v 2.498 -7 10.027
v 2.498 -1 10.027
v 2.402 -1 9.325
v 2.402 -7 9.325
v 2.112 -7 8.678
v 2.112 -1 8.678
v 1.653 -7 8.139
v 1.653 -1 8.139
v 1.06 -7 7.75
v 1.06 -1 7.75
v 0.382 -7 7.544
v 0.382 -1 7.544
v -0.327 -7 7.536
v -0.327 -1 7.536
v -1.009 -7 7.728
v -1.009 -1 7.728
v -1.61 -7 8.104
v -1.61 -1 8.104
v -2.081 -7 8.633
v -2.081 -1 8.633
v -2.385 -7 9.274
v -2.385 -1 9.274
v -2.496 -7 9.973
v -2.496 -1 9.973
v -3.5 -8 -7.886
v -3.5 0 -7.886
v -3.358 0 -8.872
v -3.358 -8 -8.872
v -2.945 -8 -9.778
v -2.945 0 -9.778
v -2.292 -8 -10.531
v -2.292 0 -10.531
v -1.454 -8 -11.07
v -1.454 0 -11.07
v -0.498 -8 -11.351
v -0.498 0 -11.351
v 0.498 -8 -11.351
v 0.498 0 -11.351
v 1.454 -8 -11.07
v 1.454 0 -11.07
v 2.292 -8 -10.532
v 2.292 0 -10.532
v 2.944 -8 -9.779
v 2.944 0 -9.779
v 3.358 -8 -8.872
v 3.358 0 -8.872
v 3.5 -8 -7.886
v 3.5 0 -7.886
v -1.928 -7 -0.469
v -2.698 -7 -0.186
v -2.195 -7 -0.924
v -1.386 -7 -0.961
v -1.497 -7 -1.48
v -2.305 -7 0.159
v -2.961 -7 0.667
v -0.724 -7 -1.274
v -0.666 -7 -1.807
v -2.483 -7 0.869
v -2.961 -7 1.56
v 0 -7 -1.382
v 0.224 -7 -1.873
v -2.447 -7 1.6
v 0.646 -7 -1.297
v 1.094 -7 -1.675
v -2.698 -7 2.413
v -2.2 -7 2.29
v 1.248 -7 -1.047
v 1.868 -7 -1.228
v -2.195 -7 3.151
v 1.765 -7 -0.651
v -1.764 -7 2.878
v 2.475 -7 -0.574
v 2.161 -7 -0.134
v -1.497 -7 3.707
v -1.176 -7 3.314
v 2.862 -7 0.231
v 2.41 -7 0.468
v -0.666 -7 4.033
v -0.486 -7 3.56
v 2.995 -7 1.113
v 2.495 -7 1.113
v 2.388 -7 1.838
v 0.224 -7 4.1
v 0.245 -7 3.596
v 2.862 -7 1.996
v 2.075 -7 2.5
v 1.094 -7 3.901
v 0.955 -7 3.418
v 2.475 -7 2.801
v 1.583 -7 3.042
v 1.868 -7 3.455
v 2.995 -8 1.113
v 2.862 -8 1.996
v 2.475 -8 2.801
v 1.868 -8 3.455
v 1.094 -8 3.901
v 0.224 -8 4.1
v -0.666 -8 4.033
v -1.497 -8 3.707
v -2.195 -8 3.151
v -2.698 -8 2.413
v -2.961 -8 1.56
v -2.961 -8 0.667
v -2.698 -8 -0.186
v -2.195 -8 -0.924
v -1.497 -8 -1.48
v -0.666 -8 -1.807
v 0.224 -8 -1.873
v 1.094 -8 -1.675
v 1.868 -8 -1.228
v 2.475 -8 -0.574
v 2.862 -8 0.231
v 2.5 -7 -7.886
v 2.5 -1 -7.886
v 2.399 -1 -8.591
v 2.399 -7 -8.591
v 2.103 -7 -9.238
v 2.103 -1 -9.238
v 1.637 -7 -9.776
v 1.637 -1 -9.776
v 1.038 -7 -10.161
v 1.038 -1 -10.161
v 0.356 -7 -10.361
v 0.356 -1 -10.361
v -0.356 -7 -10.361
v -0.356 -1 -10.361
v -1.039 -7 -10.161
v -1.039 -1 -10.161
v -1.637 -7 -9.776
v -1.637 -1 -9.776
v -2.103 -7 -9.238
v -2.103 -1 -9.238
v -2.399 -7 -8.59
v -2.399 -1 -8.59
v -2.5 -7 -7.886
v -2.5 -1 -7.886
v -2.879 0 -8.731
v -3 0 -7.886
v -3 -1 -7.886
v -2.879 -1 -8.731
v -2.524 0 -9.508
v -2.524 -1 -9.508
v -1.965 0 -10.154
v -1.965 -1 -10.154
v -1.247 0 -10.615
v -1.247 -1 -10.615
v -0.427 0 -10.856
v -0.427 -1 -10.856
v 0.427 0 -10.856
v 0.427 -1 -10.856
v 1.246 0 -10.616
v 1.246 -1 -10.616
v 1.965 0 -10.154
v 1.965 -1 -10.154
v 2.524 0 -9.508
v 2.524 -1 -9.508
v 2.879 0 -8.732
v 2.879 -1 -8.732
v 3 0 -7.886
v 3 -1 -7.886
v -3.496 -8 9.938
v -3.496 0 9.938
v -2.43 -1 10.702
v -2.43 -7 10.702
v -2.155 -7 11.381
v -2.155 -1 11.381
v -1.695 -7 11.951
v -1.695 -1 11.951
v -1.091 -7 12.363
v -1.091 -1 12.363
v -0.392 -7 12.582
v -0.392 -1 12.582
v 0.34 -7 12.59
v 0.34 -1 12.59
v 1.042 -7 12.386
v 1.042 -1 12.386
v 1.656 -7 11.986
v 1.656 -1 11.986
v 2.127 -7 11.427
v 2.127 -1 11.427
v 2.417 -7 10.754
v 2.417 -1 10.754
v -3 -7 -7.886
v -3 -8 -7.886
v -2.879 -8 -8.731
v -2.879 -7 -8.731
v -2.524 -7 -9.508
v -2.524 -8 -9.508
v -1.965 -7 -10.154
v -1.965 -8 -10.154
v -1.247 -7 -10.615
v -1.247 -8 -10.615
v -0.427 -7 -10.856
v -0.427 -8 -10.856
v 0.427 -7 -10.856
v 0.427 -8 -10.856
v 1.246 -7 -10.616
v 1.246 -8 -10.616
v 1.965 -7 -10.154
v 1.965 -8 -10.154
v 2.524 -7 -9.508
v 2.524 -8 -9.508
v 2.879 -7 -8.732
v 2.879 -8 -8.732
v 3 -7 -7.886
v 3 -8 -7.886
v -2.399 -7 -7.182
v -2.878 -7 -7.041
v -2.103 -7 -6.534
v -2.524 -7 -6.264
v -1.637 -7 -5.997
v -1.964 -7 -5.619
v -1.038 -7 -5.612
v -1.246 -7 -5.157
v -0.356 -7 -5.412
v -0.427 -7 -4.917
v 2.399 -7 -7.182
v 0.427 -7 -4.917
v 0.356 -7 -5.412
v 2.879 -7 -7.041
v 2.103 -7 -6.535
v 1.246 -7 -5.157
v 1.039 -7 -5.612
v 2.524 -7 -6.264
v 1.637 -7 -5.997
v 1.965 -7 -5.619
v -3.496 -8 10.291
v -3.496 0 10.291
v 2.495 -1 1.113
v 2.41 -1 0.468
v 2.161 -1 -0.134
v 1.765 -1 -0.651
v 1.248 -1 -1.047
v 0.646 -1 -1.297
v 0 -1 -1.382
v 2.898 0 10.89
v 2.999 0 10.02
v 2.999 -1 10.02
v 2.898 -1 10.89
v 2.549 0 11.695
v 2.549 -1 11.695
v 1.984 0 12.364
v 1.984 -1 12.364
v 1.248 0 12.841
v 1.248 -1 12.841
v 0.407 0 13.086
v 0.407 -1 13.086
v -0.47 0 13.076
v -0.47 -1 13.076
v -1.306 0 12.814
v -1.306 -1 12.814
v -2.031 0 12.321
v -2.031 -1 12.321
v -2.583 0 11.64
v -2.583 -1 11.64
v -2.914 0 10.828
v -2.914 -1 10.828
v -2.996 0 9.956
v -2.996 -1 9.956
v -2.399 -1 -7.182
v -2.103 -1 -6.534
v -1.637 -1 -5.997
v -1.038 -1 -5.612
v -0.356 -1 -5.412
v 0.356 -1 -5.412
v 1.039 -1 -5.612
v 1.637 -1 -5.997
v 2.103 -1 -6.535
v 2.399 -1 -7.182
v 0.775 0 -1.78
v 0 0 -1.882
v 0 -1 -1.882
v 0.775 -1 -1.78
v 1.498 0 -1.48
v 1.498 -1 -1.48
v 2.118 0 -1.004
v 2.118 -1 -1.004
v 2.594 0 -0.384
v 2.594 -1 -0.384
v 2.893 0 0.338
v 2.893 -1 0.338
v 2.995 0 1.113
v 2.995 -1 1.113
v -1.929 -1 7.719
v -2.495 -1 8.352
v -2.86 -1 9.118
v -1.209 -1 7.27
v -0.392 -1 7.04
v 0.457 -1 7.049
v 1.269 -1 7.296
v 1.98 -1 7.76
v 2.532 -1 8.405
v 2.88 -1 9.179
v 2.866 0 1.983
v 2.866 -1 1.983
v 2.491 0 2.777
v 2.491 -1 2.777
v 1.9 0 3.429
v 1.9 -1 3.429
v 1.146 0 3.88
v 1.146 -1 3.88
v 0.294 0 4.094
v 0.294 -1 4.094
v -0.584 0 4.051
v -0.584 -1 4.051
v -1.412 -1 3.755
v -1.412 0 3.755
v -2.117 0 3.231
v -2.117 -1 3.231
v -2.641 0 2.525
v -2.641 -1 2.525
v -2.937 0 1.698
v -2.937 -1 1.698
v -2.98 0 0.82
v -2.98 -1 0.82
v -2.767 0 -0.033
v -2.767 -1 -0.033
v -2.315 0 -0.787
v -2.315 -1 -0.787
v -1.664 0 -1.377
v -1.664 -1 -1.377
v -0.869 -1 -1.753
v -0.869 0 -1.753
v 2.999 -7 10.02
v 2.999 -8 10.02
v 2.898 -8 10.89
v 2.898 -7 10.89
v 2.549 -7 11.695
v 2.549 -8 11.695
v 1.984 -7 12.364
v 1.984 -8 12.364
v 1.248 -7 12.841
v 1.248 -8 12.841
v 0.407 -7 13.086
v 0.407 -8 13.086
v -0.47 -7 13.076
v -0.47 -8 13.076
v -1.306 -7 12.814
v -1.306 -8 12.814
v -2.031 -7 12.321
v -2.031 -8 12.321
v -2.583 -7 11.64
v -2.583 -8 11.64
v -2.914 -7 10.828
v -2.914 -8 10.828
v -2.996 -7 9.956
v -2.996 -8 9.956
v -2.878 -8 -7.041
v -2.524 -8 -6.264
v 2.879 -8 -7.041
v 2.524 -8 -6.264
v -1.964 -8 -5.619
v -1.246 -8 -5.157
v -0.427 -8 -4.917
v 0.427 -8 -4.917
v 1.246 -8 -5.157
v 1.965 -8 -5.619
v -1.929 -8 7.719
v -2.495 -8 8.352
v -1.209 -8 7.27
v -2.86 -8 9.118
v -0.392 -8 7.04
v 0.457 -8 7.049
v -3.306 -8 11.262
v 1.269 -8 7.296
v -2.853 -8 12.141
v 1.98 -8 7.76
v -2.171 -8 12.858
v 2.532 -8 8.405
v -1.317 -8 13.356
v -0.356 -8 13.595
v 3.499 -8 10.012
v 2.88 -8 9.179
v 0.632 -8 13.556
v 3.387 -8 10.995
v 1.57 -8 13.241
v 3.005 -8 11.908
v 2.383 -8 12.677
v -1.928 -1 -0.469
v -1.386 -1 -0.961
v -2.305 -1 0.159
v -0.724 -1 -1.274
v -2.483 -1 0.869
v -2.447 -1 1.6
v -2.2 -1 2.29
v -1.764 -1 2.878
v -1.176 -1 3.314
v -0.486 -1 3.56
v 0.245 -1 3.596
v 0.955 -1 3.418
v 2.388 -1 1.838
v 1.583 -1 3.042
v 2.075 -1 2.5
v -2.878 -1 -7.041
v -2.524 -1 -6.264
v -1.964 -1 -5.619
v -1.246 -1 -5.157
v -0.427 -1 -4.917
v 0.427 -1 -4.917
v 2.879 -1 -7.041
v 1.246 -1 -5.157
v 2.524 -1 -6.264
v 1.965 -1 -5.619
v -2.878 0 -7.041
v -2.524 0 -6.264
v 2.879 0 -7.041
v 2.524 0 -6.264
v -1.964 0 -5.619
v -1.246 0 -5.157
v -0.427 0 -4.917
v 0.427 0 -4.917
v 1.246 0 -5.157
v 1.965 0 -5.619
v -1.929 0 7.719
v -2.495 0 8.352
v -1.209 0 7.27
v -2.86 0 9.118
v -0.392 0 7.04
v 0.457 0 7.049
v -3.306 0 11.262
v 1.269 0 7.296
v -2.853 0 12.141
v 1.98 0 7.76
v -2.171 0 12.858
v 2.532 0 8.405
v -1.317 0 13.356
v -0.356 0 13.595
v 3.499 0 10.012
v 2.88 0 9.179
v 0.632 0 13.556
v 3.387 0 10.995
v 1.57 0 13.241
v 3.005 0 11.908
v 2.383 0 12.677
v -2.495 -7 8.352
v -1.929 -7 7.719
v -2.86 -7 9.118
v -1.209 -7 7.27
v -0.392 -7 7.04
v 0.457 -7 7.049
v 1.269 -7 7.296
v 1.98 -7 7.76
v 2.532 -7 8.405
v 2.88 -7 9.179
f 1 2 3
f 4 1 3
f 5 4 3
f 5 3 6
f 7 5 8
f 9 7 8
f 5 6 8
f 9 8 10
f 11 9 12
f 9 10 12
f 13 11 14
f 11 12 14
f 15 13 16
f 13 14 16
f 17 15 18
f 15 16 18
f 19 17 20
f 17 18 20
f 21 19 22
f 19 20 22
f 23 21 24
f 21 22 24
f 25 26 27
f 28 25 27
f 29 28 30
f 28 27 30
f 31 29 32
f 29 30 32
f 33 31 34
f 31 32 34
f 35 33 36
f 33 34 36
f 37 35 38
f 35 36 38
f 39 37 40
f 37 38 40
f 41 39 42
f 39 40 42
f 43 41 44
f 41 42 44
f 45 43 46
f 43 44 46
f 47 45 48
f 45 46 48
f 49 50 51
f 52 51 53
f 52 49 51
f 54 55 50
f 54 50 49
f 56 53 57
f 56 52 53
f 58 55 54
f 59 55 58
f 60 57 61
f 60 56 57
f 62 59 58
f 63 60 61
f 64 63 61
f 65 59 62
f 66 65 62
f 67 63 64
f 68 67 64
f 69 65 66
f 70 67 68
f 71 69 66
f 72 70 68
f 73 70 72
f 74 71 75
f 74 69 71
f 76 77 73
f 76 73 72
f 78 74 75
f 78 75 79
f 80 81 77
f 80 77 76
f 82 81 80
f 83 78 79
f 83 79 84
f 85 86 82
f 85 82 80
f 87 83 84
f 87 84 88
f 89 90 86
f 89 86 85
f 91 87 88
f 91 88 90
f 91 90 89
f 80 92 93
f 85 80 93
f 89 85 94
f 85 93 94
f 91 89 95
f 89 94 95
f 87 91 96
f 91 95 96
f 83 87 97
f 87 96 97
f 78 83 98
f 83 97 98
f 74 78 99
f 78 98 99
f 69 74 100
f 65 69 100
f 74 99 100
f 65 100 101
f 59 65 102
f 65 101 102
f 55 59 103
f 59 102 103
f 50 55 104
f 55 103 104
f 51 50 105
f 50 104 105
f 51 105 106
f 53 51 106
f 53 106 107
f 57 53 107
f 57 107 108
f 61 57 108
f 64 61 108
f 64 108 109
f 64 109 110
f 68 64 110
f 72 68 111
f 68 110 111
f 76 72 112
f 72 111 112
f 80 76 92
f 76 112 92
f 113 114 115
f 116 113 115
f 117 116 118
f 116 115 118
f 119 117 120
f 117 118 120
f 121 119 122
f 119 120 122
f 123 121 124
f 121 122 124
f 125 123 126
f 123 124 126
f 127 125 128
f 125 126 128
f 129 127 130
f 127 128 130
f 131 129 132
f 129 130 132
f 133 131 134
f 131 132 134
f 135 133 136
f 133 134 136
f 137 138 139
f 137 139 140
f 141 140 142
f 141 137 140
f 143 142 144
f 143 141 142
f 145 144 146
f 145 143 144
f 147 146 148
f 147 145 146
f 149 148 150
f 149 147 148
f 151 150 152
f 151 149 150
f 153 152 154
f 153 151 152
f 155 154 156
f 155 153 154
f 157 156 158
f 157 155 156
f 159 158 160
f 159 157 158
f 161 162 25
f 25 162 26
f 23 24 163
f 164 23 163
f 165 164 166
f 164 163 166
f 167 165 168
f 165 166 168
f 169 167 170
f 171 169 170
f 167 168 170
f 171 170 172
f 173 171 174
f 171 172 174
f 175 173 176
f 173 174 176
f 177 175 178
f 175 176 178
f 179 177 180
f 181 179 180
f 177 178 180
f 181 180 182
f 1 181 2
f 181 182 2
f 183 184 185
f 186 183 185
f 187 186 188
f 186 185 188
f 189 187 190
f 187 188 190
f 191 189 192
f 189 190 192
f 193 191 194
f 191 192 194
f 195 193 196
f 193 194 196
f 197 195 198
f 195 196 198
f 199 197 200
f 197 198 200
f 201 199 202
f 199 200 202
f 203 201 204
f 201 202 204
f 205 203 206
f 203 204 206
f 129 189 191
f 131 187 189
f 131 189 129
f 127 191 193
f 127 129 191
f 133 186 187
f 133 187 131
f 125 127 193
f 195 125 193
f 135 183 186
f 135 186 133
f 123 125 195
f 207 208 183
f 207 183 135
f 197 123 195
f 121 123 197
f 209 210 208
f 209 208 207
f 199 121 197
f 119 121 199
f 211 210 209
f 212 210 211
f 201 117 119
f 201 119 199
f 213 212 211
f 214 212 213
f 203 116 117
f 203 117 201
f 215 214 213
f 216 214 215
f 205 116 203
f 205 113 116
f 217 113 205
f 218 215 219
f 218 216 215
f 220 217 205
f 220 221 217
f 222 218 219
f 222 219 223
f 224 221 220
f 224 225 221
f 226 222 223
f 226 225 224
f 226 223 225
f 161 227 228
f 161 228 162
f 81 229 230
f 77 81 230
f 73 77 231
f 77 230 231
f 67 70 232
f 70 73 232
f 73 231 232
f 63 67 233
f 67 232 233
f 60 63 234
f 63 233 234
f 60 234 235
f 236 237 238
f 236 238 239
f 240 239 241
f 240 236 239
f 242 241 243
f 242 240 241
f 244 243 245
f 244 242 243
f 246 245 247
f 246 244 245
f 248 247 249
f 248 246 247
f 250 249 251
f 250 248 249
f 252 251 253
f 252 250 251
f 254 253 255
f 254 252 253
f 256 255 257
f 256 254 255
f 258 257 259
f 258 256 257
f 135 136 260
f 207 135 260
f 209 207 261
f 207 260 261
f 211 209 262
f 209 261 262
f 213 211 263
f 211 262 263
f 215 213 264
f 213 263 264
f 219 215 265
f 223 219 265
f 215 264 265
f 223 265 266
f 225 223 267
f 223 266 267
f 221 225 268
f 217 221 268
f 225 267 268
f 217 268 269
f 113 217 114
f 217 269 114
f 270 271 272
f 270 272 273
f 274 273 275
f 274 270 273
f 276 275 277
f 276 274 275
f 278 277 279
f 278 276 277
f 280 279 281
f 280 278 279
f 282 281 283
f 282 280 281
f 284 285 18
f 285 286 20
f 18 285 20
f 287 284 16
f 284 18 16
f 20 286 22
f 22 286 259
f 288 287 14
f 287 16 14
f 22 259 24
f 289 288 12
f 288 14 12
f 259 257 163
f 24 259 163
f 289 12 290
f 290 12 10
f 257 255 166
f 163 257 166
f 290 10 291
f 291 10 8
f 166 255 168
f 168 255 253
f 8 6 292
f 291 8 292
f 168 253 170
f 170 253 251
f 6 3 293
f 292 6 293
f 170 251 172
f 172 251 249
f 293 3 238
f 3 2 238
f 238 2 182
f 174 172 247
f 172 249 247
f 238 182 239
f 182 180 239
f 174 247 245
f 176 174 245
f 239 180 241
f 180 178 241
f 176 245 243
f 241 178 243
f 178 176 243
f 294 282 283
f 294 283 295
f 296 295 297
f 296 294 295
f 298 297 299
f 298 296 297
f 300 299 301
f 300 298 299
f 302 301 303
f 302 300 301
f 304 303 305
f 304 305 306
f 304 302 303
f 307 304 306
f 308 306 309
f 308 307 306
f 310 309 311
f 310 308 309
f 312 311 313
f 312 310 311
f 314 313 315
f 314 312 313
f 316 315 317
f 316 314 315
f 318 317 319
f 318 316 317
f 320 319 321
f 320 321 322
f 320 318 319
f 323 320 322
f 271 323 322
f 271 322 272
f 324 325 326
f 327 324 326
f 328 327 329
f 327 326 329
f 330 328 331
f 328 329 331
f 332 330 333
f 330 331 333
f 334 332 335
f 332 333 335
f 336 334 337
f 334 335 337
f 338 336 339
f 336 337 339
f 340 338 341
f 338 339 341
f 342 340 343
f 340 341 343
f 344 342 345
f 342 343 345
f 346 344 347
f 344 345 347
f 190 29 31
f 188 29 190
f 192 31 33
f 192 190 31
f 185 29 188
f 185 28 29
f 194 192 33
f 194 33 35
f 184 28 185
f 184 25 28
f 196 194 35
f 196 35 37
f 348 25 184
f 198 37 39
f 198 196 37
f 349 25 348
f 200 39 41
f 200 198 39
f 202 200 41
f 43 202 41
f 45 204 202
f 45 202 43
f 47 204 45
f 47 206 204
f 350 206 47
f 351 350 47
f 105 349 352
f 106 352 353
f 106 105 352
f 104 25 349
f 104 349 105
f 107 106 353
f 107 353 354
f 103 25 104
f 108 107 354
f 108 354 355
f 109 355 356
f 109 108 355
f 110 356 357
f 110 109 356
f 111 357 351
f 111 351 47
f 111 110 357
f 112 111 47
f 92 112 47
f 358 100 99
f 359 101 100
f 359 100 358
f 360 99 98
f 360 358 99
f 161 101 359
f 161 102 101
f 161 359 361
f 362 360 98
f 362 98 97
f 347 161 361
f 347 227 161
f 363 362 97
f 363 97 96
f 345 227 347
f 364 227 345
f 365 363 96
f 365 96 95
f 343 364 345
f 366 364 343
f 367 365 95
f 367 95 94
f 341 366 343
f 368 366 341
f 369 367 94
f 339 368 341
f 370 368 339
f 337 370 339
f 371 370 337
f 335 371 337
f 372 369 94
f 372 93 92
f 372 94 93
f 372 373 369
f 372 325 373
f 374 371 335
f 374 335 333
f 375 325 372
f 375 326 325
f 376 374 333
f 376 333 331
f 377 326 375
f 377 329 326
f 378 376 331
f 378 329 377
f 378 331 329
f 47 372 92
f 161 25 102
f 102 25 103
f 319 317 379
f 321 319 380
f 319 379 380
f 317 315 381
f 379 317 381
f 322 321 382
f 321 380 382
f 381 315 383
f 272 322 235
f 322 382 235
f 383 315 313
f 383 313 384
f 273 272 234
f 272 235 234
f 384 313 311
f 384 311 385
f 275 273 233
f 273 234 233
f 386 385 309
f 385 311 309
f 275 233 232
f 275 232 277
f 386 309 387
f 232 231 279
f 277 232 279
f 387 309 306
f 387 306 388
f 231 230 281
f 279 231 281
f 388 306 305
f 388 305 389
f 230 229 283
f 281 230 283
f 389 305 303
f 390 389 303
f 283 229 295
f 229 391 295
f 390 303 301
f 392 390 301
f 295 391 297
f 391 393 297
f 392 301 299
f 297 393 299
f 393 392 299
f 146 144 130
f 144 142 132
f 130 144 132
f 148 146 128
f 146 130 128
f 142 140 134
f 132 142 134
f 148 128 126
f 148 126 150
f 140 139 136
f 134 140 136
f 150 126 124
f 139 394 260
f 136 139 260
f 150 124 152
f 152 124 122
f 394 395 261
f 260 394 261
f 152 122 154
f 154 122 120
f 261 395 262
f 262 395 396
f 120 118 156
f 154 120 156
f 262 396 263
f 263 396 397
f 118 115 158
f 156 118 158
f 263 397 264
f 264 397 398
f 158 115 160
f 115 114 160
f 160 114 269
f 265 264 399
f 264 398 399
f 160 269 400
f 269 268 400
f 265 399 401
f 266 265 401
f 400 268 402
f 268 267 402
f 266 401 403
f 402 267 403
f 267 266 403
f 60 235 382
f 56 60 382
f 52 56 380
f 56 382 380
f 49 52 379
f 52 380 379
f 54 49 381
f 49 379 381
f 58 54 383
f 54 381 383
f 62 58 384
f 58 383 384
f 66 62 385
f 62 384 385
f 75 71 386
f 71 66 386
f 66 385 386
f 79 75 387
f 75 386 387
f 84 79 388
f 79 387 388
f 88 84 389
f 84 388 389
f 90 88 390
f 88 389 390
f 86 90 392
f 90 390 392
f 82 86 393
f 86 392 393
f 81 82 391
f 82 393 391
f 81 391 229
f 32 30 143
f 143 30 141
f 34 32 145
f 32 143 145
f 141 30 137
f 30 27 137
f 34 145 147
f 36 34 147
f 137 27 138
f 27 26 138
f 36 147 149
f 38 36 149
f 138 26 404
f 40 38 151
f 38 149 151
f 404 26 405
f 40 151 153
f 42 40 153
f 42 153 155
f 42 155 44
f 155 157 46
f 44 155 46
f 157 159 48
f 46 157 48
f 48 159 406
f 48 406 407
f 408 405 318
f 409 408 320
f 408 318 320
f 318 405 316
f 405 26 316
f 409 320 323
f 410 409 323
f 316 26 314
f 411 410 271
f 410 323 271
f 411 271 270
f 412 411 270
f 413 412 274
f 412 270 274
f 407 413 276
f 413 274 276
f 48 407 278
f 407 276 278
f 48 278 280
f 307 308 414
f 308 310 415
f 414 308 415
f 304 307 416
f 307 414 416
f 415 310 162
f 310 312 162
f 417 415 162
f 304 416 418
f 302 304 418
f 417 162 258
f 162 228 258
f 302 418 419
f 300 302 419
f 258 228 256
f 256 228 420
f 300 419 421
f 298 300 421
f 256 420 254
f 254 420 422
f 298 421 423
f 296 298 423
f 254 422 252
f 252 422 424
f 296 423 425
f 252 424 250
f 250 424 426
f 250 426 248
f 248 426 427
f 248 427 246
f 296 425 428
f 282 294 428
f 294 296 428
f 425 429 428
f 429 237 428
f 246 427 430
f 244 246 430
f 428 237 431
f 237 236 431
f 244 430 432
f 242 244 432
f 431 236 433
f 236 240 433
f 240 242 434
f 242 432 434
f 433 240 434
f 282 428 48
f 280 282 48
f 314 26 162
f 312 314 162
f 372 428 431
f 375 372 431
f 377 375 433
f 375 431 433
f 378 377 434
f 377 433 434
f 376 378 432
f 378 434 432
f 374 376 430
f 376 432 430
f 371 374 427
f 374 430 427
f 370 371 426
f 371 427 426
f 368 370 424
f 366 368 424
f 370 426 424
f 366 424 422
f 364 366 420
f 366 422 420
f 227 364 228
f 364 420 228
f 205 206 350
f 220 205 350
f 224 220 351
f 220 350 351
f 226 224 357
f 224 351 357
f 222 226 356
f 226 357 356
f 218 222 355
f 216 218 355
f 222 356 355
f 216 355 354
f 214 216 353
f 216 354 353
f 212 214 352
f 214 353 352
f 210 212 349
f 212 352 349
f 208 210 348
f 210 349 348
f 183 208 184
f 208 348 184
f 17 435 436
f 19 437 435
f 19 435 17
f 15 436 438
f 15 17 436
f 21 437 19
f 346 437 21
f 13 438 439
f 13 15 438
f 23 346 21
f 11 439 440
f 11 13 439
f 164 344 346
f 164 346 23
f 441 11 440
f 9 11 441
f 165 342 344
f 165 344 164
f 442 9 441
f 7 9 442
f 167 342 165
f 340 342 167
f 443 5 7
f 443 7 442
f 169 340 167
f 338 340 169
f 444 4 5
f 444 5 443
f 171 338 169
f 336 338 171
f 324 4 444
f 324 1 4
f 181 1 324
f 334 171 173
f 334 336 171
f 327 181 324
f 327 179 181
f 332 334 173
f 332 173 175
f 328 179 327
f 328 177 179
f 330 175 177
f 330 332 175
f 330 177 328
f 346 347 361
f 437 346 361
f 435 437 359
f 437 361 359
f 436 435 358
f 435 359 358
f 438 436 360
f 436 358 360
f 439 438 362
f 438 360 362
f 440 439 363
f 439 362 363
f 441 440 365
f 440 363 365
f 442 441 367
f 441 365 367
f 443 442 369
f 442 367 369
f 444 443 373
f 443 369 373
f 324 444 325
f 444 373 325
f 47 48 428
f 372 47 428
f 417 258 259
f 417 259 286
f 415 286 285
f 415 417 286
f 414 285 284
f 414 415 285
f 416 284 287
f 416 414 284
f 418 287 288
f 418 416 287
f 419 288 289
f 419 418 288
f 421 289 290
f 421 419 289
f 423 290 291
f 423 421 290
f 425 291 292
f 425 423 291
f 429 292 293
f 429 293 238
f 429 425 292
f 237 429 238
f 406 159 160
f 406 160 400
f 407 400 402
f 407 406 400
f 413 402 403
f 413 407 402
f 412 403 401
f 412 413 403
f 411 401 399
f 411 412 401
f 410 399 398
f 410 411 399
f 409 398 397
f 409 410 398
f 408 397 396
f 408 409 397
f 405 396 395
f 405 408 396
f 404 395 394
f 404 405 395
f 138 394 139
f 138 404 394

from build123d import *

# Parameters (mm, degrees)
F1_DEPTH = 8
F2_DEPTH = 1
F3_R     = 2.995
F3_R_2   = 2.495
F4_DEPTH = 1


with BuildPart() as f1:
    # F0 (on Front) → F1 (new body)
    with BuildSketch(Plane.XZ):
        with BuildLine():
            Line((3.4999999884, -7.8863207898), (3.4985407065, 10.0123348381))
            ThreePointArc((3.4985407065, 10.0123348381), (0.1392265828, 13.6106236093), (-3.495502424, 10.2907714275))
            Line((-3.495502424, 10.2907714275), (-3.4955897742, 9.9377461081))
            Line((-3.4955897742, 9.9377461081), (-3.4999998929, -7.8857401302))
            ThreePointArc((-3.4999998929, -7.8857401302), (-0.0002903298, -11.3866061336), (3.4999999884, -7.8863207898))
        make_face()
        with BuildLine():
            ThreePointArc((-2.9999999082, -7.8858638467), (0.0002488951, -4.8861127517), (2.99999999, -7.8863615549))
            ThreePointArc((2.99999999, -7.8863615549), (-0.0002488541, -10.8866061353), (-2.9999999082, -7.8858638467))
        make_face(mode=Mode.SUBTRACT)
        with BuildLine():
            ThreePointArc((2.9952903298, 1.1133938423), (2.1180751395, -1.0043909674), (0.0002903298, -1.8816061577))
            ThreePointArc((0.0002903298, -1.8816061577), (-2.1174944798, 3.231178652), (2.9952903298, 1.1133938423))
        make_face(mode=Mode.SUBTRACT)
        with BuildLine():
            ThreePointArc((2.9985313735, 10.0195343729), (0.0330453014, 7.0147601911), (-2.9958477024, 9.9556074667))
            ThreePointArc((-2.9958477024, 9.9556074667), (-0.031991606, 13.1132232724), (2.9985313735, 10.0195343729))
        make_face(mode=Mode.SUBTRACT)
        with BuildLine():
            ThreePointArc((2.9985313735, 10.0195343729), (-0.031991606, 13.1132232724), (-2.9958477024, 9.9556074667))
            ThreePointArc((-2.9958477024, 9.9556074667), (0.0330453014, 7.0147601911), (2.9985313735, 10.0195343729))
        make_face()
        with BuildLine():
            ThreePointArc((-2.4960813645, 9.9734690786), (-0.0266596741, 12.6132519269), (2.4984977744, 10.0267336432))
            ThreePointArc((2.4984977744, 10.0267336432), (0.0277133695, 7.5147315366), (-2.4960813645, 9.9734690786))
        make_face(mode=Mode.SUBTRACT)
        with BuildLine():
            ThreePointArc((2.9952903298, 1.1133938423), (-2.1174944798, 3.231178652), (0.0002903298, -1.8816061577))
            ThreePointArc((0.0002903298, -1.8816061577), (2.1180751395, -1.0043909674), (2.9952903298, 1.1133938423))
        make_face()
        with BuildLine():
            ThreePointArc((2.4952903298, 1.1133938423), (1.7645217489, -0.6508375768), (0.0002903298, -1.3816061577))
            ThreePointArc((0.0002903298, -1.3816061577), (-1.7639410893, 2.8776252614), (2.4952903298, 1.1133938423))
        make_face(mode=Mode.SUBTRACT)
        with BuildLine():
            ThreePointArc((-2.9999999082, -7.8858638467), (-0.0002488541, -10.8866061353), (2.99999999, -7.8863615549))
            ThreePointArc((2.99999999, -7.8863615549), (0.0002488951, -4.8861127517), (-2.9999999082, -7.8858638467))
        make_face()
        with BuildLine():
            ThreePointArc((-2.4999999235, -7.8859875632), (0.0002074125, -5.386194984), (2.4999999917, -7.88640232))
            ThreePointArc((2.4999999917, -7.88640232), (-0.0002073784, -10.3866061371), (-2.4999999235, -7.8859875632))
        make_face(mode=Mode.SUBTRACT)
    extrude(amount=F1_DEPTH)

    # F0 (on Front) → F2 (cut)
    with BuildSketch(Plane.XZ):
        with BuildLine():
            ThreePointArc((2.9985313735, 10.0195343729), (-0.031991606, 13.1132232724), (-2.9958477024, 9.9556074667))
            ThreePointArc((-2.9958477024, 9.9556074667), (0.0330453014, 7.0147601911), (2.9985313735, 10.0195343729))
        make_face()
        with BuildLine():
            ThreePointArc((-2.4960813645, 9.9734690786), (-0.0266596741, 12.6132519269), (2.4984977744, 10.0267336432))
            ThreePointArc((2.4984977744, 10.0267336432), (0.0277133695, 7.5147315366), (-2.4960813645, 9.9734690786))
        make_face(mode=Mode.SUBTRACT)
        with BuildLine():
            ThreePointArc((2.9952903298, 1.1133938423), (-2.1174944798, 3.231178652), (0.0002903298, -1.8816061577))
            ThreePointArc((0.0002903298, -1.8816061577), (2.1180751395, -1.0043909674), (2.9952903298, 1.1133938423))
        make_face()
        with BuildLine():
            ThreePointArc((2.4952903298, 1.1133938423), (1.7645217489, -0.6508375768), (0.0002903298, -1.3816061577))
            ThreePointArc((0.0002903298, -1.3816061577), (-1.7639410893, 2.8776252614), (2.4952903298, 1.1133938423))
        make_face(mode=Mode.SUBTRACT)
        with BuildLine():
            ThreePointArc((-2.9999999082, -7.8858638467), (-0.0002488541, -10.8866061353), (2.99999999, -7.8863615549))
            ThreePointArc((2.99999999, -7.8863615549), (0.0002488951, -4.8861127517), (-2.9999999082, -7.8858638467))
        make_face()
        with BuildLine():
            ThreePointArc((-2.4999999235, -7.8859875632), (0.0002074125, -5.386194984), (2.4999999917, -7.88640232))
            ThreePointArc((2.4999999917, -7.88640232), (-0.0002073784, -10.3866061371), (-2.4999999235, -7.8859875632))
        make_face(mode=Mode.SUBTRACT)
    extrude(amount=F2_DEPTH, mode=Mode.SUBTRACT)

    # F3 (on face) → F4 (cut)
    with BuildSketch(Plane.XZ.offset(8)):
        with BuildLine():
            ThreePointArc((2.9985313735, 10.0195343729), (-0.031991606, 13.1132232724), (-2.9958477024, 9.9556074667))
            ThreePointArc((-2.9958477024, 9.9556074667), (0.0330453014, 7.0147601911), (2.9985313735, 10.0195343729))
        make_face()
        with BuildLine():
            ThreePointArc((2.4984977744, 10.0267336432), (0.0277133695, 7.5147315366), (-2.4960813645, 9.9734690786))
            ThreePointArc((-2.4960813645, 9.9734690786), (-0.0266596741, 12.6132519269), (2.4984977744, 10.0267336432))
        make_face(mode=Mode.SUBTRACT)
        with Locations((0.0002903298, 1.1133938423)):
            Circle(F3_R)
        with Locations((0.0002903298, 1.1133938423)):
            Circle(F3_R_2, mode=Mode.SUBTRACT)
        with BuildLine():
            ThreePointArc((-2.9999999082, -7.8858638467), (-0.0002488541, -10.8866061353), (2.99999999, -7.8863615549))
            ThreePointArc((2.99999999, -7.8863615549), (0.0002488951, -4.8861127517), (-2.9999999082, -7.8858638467))
        make_face()
        with BuildLine():
            ThreePointArc((-2.4999999235, -7.8859875632), (0.0002074125, -5.386194984), (2.4999999917, -7.88640232))
            ThreePointArc((2.4999999917, -7.88640232), (-0.0002073784, -10.3866061371), (-2.4999999235, -7.8859875632))
        make_face(mode=Mode.SUBTRACT)
    extrude(amount=-F4_DEPTH, mode=Mode.SUBTRACT)


solid = f1.part
